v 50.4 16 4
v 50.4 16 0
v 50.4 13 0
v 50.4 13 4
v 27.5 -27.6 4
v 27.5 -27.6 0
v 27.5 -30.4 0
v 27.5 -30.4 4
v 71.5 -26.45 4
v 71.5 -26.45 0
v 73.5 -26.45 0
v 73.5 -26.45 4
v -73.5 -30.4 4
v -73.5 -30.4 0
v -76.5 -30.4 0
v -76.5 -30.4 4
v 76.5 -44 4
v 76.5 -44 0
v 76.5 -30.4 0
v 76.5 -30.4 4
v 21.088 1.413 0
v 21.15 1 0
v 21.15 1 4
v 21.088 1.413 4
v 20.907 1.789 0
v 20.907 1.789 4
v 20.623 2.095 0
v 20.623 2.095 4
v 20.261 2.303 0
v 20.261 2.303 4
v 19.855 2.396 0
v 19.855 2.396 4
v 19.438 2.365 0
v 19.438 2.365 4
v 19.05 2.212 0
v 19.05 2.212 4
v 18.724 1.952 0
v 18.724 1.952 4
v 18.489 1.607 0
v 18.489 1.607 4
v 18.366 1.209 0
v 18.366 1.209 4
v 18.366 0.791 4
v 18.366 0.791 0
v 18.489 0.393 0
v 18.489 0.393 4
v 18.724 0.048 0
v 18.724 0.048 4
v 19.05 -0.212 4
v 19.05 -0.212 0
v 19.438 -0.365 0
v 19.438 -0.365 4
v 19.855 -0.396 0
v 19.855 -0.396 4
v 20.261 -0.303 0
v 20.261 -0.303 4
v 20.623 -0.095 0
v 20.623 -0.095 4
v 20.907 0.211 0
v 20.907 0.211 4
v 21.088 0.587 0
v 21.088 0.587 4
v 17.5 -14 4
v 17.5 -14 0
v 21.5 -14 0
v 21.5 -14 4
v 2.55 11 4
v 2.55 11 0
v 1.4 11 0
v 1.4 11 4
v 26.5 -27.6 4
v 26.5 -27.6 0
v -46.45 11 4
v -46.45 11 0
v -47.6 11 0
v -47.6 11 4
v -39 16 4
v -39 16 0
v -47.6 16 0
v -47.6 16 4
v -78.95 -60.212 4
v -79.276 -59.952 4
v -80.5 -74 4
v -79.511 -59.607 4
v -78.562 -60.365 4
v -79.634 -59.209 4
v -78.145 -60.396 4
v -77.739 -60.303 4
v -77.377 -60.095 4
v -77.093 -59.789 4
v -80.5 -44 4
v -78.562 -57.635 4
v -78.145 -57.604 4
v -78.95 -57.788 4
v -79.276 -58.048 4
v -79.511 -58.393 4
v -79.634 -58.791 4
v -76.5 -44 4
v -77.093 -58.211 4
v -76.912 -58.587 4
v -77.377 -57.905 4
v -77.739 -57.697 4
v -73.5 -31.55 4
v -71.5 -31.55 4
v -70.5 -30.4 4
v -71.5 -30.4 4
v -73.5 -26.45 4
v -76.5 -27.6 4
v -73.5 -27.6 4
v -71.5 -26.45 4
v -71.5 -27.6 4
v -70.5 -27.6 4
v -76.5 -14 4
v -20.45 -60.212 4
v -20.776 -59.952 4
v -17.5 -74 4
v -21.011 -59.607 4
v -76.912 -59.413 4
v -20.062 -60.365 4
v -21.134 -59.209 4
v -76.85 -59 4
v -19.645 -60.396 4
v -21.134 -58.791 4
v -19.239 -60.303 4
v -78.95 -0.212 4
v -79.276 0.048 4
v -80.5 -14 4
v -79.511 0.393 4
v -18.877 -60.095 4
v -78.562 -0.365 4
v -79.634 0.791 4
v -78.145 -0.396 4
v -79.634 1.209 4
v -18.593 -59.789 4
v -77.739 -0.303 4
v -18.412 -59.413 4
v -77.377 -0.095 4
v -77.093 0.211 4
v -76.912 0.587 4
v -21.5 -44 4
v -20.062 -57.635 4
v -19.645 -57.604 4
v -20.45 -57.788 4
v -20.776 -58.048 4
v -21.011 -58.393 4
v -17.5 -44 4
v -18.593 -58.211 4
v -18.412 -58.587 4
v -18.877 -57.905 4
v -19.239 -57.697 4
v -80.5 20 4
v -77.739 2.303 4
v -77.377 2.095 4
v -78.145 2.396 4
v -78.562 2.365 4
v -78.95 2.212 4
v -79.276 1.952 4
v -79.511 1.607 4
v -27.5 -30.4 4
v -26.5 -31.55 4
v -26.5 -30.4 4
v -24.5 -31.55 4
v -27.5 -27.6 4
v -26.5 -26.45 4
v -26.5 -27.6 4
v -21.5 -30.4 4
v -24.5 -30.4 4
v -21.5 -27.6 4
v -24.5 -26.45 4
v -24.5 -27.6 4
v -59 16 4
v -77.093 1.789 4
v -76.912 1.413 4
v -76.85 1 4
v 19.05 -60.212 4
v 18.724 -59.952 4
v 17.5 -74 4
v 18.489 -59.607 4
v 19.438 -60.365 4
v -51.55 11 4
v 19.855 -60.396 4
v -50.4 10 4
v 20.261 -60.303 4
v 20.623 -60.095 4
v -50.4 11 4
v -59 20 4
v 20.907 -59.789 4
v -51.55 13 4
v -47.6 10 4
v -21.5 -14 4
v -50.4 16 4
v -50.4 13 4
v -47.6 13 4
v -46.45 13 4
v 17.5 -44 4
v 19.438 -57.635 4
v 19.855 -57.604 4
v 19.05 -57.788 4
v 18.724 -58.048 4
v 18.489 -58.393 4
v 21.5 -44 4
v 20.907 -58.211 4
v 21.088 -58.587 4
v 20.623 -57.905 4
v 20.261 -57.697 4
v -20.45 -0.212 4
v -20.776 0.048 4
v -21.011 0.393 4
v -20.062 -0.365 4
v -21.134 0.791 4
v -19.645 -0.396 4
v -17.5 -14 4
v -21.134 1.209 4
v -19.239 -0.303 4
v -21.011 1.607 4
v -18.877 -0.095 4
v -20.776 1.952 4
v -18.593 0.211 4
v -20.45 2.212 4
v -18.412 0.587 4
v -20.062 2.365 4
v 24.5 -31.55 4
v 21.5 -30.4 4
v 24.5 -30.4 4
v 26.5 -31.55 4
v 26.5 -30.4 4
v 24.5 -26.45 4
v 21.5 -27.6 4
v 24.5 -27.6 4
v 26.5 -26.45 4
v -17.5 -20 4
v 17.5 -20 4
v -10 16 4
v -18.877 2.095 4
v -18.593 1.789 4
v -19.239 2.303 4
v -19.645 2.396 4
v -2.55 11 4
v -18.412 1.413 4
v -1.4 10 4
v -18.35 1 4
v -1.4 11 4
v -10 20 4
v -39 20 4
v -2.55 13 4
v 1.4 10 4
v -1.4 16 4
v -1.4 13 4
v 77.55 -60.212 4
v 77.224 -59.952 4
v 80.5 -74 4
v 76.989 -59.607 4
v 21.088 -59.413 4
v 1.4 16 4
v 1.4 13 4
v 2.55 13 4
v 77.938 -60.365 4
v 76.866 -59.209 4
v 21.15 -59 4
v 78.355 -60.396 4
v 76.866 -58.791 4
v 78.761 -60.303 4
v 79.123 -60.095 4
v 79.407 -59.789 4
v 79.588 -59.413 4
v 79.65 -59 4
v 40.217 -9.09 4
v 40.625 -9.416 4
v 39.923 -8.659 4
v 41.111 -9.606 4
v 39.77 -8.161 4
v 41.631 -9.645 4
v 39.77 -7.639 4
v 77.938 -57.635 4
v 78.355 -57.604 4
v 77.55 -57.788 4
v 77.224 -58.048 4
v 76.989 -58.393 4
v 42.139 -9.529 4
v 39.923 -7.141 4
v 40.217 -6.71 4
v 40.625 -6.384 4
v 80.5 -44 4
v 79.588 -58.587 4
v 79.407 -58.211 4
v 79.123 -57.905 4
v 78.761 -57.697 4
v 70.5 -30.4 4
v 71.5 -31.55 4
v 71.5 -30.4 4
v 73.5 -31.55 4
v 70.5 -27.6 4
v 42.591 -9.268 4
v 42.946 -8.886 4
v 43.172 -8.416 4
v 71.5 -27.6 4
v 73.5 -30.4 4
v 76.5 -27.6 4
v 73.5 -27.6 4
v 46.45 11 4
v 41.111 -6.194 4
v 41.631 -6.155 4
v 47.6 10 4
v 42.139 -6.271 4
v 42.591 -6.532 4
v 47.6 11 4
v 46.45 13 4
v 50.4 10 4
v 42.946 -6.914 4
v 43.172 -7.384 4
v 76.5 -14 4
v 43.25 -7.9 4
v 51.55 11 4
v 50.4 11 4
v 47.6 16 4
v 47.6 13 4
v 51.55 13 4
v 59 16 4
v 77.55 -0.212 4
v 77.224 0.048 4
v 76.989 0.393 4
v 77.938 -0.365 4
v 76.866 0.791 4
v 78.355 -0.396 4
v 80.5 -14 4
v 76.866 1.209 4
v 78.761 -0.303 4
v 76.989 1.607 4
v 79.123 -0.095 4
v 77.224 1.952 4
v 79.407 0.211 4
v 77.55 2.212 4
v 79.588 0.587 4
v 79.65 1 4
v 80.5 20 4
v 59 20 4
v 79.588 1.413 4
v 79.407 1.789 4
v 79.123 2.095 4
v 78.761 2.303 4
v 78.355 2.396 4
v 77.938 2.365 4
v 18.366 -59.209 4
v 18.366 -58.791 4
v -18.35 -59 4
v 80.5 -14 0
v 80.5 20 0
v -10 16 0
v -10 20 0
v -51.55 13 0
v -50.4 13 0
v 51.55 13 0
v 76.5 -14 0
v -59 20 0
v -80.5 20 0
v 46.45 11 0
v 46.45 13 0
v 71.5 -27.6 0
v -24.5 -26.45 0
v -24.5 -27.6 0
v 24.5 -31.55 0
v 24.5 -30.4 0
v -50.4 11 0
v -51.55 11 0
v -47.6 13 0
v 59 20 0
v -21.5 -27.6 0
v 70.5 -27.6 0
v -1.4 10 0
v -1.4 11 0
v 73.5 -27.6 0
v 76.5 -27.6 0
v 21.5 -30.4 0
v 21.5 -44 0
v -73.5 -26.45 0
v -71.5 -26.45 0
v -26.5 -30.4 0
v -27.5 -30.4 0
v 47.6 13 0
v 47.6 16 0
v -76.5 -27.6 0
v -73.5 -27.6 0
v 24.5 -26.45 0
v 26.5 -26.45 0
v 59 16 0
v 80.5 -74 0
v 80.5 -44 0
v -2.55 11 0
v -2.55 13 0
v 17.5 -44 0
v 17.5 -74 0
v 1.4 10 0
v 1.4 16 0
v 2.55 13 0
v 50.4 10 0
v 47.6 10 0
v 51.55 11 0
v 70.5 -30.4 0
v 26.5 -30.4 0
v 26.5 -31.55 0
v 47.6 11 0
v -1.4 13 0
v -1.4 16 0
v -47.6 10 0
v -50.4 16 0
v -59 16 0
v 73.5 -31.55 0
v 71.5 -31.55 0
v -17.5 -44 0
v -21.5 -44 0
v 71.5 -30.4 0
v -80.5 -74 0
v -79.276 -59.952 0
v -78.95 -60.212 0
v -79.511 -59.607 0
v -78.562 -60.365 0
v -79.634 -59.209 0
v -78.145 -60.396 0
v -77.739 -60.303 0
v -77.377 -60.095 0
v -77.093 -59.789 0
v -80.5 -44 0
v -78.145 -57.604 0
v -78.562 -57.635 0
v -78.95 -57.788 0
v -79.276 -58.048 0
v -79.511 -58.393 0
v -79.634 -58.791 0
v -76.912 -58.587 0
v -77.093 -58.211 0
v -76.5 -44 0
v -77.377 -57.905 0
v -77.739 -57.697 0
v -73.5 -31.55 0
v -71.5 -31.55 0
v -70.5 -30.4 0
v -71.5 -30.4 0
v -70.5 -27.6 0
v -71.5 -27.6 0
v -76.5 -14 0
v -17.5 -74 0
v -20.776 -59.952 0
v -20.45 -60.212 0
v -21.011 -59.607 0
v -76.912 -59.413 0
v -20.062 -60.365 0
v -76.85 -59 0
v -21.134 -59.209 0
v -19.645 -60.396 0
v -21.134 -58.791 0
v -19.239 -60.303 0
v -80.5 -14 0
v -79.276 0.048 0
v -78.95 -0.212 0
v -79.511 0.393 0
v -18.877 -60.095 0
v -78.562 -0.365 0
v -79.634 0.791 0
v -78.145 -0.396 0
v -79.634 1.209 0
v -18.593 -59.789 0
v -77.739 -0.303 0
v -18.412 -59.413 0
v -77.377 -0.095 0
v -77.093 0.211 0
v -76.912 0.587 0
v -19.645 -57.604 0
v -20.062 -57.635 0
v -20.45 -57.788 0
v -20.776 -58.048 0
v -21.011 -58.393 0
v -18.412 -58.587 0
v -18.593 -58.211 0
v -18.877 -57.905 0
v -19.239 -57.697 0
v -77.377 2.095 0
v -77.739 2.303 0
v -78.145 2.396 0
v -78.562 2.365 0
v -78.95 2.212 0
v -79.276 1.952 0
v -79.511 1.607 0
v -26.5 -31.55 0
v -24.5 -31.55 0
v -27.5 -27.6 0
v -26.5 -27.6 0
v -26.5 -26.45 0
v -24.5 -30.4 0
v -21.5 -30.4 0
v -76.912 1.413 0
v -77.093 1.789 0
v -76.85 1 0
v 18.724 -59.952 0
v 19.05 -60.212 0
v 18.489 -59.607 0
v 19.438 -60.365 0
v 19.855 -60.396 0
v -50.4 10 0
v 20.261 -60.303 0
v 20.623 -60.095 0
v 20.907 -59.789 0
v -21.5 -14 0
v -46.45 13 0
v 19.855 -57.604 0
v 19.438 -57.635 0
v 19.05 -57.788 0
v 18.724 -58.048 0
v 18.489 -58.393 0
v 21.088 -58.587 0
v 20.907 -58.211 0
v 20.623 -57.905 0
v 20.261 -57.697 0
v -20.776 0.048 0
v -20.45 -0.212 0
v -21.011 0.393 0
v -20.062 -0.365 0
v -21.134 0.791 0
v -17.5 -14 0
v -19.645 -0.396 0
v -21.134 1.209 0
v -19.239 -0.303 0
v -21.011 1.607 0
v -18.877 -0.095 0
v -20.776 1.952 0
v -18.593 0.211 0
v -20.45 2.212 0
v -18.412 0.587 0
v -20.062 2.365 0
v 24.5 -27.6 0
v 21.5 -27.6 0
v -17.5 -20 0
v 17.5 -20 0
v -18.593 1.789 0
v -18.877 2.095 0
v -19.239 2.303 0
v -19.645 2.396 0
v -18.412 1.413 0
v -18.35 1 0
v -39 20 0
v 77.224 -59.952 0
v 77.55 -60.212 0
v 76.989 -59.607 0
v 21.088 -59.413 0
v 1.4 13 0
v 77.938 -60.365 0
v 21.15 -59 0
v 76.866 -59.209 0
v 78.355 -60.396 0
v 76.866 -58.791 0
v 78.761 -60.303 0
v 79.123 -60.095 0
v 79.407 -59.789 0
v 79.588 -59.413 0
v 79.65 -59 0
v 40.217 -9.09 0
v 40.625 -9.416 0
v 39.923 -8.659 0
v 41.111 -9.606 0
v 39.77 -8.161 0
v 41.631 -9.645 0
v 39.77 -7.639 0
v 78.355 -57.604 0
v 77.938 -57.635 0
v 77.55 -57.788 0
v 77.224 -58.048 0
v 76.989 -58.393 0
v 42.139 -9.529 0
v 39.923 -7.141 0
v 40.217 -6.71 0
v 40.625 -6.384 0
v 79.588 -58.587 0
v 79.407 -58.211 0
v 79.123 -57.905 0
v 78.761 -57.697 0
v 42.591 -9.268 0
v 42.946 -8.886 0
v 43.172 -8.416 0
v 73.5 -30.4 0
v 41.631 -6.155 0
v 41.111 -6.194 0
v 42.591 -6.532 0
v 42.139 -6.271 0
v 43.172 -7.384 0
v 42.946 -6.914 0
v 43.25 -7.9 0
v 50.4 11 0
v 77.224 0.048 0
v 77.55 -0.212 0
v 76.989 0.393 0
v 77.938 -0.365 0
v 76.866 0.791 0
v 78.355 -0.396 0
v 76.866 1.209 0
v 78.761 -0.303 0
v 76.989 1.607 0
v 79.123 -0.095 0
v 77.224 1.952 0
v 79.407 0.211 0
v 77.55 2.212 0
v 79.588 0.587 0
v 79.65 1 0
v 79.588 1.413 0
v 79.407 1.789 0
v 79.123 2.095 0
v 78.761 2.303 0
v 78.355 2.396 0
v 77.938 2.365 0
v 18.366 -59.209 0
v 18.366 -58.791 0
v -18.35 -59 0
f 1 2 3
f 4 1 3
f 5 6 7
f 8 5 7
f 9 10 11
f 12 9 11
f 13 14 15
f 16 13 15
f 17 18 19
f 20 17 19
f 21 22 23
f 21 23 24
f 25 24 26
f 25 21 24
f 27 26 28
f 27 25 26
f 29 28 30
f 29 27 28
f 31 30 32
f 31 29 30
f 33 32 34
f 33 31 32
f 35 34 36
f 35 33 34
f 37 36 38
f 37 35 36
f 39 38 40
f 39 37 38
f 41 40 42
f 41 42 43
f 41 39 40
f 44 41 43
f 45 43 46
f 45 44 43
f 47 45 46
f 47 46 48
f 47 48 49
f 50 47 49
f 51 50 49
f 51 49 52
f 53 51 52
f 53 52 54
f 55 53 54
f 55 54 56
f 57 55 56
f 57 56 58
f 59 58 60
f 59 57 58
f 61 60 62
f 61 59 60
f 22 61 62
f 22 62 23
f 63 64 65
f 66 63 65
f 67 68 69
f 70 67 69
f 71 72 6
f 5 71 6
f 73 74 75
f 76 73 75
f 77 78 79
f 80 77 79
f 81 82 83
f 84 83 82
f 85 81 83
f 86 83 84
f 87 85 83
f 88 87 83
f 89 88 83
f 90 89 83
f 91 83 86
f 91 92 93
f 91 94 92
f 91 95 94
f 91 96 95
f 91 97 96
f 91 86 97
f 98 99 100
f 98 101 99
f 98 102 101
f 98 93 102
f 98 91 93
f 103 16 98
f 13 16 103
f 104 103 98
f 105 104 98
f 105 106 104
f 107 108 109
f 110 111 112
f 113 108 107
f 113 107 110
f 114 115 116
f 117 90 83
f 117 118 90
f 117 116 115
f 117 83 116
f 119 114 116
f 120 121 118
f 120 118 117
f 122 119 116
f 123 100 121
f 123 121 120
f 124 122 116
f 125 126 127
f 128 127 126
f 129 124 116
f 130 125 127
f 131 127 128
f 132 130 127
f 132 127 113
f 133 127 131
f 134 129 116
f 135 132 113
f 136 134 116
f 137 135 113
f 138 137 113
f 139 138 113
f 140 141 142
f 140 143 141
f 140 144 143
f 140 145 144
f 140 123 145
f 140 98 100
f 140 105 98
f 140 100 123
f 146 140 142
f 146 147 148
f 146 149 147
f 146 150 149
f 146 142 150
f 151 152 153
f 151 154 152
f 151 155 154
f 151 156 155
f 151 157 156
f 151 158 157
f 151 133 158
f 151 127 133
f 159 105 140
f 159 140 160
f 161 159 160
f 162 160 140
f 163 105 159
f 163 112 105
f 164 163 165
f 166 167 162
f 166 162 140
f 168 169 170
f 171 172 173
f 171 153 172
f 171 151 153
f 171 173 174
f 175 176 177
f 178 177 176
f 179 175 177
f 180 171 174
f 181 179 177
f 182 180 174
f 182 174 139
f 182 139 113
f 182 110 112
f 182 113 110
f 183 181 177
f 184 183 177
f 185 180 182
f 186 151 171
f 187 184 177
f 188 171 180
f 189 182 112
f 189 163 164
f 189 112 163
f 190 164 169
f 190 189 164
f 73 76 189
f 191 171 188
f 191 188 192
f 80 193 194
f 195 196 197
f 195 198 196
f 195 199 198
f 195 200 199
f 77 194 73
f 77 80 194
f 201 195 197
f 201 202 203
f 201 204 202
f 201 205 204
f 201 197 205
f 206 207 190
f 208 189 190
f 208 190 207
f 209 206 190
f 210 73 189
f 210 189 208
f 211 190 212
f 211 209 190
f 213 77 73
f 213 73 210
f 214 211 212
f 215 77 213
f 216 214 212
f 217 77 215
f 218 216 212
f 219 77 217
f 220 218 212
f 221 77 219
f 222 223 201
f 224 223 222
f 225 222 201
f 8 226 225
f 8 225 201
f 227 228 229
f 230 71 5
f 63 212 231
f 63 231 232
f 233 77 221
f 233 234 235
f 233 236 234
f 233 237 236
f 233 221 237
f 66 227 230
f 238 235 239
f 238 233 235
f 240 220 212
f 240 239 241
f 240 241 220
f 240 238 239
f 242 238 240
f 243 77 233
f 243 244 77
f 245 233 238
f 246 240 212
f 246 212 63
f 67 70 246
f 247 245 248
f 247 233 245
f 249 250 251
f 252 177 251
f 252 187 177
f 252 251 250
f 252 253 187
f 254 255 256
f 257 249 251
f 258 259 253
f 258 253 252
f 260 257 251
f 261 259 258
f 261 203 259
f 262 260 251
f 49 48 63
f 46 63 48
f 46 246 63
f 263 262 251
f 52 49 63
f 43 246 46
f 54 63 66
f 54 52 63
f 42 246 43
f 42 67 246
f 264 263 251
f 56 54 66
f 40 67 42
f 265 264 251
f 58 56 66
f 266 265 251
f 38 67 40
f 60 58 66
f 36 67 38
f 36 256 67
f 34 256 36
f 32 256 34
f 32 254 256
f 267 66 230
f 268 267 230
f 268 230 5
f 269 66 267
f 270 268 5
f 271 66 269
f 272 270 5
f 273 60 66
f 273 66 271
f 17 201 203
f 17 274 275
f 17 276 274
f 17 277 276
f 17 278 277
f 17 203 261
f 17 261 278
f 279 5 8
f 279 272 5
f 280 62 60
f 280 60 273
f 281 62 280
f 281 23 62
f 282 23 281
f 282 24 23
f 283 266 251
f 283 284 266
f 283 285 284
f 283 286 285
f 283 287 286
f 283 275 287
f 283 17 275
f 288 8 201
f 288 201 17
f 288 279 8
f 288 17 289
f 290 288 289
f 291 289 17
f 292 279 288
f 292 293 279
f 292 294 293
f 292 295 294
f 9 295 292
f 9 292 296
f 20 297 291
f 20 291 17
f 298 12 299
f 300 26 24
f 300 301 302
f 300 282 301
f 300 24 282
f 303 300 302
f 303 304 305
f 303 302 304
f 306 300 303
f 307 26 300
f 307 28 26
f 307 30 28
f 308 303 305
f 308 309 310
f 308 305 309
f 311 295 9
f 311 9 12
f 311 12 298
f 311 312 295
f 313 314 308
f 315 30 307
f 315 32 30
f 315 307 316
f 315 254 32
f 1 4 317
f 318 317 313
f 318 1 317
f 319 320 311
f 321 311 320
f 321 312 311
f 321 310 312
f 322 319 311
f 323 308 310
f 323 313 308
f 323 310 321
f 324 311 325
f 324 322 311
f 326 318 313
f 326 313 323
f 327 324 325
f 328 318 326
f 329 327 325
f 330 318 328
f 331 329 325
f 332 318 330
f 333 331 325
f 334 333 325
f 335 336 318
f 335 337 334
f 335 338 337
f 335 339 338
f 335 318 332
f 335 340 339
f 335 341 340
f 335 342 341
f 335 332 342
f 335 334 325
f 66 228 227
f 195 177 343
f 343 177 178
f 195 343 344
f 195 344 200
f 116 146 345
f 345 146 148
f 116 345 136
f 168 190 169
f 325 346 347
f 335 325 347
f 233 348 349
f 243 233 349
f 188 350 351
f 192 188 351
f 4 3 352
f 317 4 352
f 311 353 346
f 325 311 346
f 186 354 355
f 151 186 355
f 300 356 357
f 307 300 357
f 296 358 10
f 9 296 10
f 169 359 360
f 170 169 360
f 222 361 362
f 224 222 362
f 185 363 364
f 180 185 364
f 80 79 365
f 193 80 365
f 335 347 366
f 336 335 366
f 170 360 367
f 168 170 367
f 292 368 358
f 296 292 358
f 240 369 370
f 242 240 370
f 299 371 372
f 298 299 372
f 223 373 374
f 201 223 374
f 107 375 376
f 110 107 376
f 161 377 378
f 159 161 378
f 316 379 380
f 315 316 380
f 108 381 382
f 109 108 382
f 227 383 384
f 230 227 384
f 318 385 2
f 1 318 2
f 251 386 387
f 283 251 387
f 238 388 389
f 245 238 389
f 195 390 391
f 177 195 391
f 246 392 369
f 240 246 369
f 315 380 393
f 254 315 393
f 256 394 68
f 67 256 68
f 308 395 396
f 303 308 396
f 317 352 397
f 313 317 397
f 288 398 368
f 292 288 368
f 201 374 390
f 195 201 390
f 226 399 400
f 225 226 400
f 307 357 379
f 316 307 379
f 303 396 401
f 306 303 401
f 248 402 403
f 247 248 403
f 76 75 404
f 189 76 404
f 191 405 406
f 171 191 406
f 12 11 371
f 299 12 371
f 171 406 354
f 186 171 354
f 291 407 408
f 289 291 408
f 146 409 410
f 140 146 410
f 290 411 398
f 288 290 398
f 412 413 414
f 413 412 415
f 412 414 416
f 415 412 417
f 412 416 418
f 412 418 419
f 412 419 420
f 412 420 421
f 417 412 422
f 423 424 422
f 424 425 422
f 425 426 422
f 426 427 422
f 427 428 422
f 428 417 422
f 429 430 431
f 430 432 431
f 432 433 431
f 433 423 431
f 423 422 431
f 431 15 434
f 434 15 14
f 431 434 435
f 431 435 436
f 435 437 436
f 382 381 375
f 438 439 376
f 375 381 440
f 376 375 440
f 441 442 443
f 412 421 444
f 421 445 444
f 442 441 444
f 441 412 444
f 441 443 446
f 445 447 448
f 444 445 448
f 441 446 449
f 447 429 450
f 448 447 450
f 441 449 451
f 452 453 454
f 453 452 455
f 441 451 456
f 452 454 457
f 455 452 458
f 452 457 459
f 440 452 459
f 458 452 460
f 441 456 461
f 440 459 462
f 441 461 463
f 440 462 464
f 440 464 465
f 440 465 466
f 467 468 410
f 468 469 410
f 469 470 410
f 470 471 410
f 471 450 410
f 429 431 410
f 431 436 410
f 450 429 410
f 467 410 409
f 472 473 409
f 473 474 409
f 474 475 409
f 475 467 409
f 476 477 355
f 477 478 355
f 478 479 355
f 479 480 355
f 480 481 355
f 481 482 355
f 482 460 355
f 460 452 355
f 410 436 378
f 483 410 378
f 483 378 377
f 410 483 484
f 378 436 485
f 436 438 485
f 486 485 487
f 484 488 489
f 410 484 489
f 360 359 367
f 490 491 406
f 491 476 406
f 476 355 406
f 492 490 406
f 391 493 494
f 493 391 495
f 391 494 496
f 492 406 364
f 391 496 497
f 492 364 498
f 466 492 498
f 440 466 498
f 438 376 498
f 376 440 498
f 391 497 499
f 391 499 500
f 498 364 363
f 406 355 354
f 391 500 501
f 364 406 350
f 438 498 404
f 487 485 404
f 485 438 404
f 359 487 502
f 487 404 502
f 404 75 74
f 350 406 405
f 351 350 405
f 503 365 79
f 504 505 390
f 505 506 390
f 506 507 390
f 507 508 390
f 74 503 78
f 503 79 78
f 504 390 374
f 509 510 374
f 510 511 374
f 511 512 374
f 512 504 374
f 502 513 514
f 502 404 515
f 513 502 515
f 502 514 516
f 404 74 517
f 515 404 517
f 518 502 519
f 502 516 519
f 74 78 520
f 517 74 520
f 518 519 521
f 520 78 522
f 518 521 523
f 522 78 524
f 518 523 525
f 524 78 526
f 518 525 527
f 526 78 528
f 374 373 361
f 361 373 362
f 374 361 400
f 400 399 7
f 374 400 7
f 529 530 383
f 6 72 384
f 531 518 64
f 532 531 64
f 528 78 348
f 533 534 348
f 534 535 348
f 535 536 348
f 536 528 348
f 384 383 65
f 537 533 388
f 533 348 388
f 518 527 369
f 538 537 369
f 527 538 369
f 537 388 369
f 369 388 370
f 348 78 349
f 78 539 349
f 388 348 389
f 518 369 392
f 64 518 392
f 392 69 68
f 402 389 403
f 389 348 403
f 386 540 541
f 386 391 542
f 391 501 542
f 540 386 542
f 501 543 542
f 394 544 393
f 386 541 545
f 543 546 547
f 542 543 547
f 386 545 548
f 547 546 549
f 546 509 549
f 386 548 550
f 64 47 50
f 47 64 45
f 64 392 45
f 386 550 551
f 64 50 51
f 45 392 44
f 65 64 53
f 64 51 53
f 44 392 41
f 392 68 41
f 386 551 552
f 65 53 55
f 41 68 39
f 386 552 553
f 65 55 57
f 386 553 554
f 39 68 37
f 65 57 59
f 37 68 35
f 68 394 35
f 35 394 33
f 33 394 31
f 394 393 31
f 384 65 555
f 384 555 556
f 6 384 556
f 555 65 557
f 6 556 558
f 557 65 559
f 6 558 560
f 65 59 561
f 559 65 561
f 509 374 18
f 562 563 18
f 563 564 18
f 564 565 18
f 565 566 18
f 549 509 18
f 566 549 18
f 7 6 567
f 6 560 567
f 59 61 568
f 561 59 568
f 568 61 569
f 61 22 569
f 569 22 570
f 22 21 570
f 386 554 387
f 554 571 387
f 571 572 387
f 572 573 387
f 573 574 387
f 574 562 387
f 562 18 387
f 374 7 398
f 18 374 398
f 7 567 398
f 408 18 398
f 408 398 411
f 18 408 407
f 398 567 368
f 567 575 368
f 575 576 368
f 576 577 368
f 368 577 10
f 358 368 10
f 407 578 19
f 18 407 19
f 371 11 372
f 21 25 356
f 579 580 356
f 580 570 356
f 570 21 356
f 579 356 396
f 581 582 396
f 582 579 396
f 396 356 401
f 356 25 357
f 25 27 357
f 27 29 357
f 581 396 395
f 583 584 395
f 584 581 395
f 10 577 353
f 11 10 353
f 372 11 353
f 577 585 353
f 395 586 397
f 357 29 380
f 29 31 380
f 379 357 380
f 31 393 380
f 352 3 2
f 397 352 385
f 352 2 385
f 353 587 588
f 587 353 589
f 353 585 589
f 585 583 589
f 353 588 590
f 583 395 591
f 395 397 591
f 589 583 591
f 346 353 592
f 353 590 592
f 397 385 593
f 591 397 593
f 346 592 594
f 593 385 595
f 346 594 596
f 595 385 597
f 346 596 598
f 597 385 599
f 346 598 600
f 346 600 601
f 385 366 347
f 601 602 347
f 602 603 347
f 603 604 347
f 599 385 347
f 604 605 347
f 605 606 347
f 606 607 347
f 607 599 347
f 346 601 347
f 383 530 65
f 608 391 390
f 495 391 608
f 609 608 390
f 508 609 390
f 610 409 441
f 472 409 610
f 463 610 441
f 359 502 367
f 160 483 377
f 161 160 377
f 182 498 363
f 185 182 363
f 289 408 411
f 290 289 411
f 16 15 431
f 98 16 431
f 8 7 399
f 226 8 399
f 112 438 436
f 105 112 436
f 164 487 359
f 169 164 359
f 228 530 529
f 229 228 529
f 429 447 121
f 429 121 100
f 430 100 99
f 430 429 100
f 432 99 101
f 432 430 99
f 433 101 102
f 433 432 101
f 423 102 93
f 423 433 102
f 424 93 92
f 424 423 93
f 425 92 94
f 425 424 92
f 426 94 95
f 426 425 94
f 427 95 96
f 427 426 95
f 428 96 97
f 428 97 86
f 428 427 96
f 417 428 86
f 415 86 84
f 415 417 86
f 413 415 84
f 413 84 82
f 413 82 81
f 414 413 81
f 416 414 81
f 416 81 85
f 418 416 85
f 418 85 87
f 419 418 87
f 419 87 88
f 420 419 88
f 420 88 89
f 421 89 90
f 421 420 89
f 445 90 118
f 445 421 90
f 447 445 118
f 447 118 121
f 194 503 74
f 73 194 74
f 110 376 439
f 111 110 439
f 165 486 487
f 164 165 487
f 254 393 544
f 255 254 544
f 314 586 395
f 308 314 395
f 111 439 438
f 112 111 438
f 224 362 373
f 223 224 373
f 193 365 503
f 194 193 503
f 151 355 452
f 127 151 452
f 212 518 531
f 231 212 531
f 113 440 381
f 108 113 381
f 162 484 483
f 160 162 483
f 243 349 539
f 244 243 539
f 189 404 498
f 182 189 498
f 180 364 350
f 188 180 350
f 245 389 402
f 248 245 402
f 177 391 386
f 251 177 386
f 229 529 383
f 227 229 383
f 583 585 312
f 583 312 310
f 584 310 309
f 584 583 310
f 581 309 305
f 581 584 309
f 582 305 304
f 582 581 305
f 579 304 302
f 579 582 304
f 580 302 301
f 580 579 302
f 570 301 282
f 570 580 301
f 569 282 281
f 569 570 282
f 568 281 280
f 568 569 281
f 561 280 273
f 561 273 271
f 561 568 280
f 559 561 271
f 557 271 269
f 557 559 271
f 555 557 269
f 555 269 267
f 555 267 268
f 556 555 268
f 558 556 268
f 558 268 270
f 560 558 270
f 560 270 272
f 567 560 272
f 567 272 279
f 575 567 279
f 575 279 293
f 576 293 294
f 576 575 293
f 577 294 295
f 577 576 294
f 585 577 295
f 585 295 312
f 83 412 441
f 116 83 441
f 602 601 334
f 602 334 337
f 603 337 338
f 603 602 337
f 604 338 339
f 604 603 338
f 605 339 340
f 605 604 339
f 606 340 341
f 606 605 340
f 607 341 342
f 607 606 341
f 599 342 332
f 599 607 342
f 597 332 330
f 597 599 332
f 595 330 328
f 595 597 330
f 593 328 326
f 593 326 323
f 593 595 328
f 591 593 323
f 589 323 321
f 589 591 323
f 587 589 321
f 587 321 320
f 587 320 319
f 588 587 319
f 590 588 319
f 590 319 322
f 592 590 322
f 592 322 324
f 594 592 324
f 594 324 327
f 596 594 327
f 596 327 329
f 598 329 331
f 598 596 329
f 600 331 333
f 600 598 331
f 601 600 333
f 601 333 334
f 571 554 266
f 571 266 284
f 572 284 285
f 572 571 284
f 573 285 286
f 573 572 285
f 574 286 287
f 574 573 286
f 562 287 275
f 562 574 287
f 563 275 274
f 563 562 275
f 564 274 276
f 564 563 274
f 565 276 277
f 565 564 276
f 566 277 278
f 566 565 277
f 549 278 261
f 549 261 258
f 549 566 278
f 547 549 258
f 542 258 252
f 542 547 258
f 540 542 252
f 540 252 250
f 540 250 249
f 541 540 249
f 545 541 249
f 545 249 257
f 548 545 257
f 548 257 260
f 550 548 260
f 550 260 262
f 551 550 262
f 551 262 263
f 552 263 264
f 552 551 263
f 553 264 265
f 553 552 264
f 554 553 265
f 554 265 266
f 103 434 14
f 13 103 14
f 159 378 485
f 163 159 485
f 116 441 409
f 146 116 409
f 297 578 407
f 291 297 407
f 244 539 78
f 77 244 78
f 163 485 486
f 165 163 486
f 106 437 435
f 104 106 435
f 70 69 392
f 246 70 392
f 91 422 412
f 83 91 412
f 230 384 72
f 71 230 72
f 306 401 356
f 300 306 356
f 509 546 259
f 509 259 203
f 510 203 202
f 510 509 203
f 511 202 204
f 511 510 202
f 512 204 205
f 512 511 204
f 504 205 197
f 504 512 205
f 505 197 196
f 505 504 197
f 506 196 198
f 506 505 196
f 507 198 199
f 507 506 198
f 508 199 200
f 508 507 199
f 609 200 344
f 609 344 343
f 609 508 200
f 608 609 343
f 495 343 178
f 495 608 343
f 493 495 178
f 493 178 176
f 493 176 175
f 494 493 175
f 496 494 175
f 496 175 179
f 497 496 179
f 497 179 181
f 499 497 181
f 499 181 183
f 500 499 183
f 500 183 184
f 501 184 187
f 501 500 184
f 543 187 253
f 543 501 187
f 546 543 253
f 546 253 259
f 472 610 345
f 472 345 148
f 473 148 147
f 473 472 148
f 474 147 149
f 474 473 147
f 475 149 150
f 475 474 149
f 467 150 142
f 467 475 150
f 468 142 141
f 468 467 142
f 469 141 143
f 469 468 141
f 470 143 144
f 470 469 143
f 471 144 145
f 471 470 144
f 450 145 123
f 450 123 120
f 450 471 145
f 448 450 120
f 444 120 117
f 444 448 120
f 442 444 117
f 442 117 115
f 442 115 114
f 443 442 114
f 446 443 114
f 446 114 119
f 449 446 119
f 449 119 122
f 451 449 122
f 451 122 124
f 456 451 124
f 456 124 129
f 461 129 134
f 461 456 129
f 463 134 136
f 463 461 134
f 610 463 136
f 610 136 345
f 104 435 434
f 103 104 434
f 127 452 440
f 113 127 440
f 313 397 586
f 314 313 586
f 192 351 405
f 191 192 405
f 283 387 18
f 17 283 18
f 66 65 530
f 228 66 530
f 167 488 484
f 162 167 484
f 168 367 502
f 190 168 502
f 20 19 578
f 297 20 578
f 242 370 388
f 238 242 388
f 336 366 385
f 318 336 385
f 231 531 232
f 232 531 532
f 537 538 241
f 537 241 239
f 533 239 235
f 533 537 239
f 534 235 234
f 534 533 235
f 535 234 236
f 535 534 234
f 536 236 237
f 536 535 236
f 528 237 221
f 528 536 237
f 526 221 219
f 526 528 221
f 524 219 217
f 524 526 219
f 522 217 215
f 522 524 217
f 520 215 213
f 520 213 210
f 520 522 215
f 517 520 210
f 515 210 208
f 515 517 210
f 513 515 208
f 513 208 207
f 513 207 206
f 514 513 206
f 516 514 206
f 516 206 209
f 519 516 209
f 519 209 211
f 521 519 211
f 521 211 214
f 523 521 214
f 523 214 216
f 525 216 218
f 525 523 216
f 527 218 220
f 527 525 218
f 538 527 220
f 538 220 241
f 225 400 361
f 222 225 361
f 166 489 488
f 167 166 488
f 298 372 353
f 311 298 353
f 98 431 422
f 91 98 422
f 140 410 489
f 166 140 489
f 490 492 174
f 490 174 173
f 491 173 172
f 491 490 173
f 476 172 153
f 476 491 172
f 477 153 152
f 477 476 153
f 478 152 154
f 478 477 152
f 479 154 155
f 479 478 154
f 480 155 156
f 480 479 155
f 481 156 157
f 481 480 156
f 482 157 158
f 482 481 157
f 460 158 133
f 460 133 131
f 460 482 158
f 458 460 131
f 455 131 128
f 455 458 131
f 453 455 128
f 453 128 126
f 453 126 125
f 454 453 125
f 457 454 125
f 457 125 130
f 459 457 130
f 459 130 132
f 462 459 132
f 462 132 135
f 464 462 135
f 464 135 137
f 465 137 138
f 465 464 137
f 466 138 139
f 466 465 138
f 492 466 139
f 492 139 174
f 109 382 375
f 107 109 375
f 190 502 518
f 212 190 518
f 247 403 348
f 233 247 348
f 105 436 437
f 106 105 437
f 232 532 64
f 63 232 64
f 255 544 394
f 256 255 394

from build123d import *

# Parameters (mm, degrees)
SKETCH_1_R      = 1.4
SKETCH_1_R_2    = 1.75
EXTRUDE_1_DEPTH = 4


with BuildPart() as part:
    # Эскиз1 → Бобышка-Вытянуть1 (new body)
    with BuildSketch(Plane.XY):
        Polygon((-17.5, -14), (-17.5, -20), (17.5, -20), (17.5, -14), (21.5, -14), (21.5, -27.6), (24.5, -27.6), (24.5, -26.45), (26.5, -26.45), (26.5, -27.6), (27.5, -27.6), (27.5, -30.4), (26.5, -30.4), (26.5, -31.55), (24.5, -31.55), (24.5, -30.4), (21.5, -30.4), (21.5, -44), (17.5, -44), (17.5, -74), (80.5, -74), (80.5, -44), (76.5, -44), (76.5, -30.4), (73.5, -30.4), (73.5, -31.55), (71.5, -31.55), (71.5, -30.4), (70.5, -30.4), (70.5, -27.6), (71.5, -27.6), (71.5, -26.45), (73.5, -26.45), (73.5, -27.6), (76.5, -27.6), (76.5, -14), (80.5, -14), (80.5, 20), (59, 20), (59, 16), (50.4, 16), (50.4, 13), (51.55, 13), (51.55, 11), (50.4, 11), (50.4, 10), (47.6, 10), (47.6, 11), (46.45, 11), (46.45, 13), (47.6, 13), (47.6, 16), (1.4, 16), (1.4, 13), (2.55, 13), (2.55, 11), (1.4, 11), (1.4, 10), (-1.4, 10), (-1.4, 11), (-2.55, 11), (-2.55, 13), (-1.4, 13), (-1.4, 16), (-10, 16), (-10, 20), (-39, 20), (-39, 16), (-47.6, 16), (-47.6, 13), (-46.45, 13), (-46.45, 11), (-47.6, 11), (-47.6, 10), (-50.4, 10), (-50.4, 11), (-51.55, 11), (-51.55, 13), (-50.4, 13), (-50.4, 16), (-59, 16), (-59, 20), (-80.5, 20), (-80.5, -14), (-76.5, -14), (-76.5, -27.6), (-73.5, -27.6), (-73.5, -26.45), (-71.5, -26.45), (-71.5, -27.6), (-70.5, -27.6), (-70.5, -30.4), (-71.5, -30.4), (-71.5, -31.55), (-73.5, -31.55), (-73.5, -30.4), (-76.5, -30.4), (-76.5, -44), (-80.5, -44), (-80.5, -74), (-17.5, -74), (-17.5, -44), (-21.5, -44), (-21.5, -30.4), (-24.5, -30.4), (-24.5, -31.55), (-26.5, -31.55), (-26.5, -30.4), (-27.5, -30.4), (-27.5, -27.6), (-26.5, -27.6), (-26.5, -26.45), (-24.5, -26.45), (-24.5, -27.6), (-21.5, -27.6), (-21.5, -14), align=None)
        with Locations((-19.75, 1)):
            Circle(SKETCH_1_R, mode=Mode.SUBTRACT)
        with Locations((-78.25, -59)):
            Circle(SKETCH_1_R, mode=Mode.SUBTRACT)
        with Locations((-19.75, -59)):
            Circle(SKETCH_1_R, mode=Mode.SUBTRACT)
        with Locations((-78.25, 1)):
            Circle(SKETCH_1_R, mode=Mode.SUBTRACT)
        with Locations((78.25, 1)):
            Circle(SKETCH_1_R, mode=Mode.SUBTRACT)
        with Locations((19.75, -59)):
            Circle(SKETCH_1_R, mode=Mode.SUBTRACT)
        with Locations((78.25, -59)):
            Circle(SKETCH_1_R, mode=Mode.SUBTRACT)
        with Locations((41.5, -7.9)):
            Circle(SKETCH_1_R_2, mode=Mode.SUBTRACT)
        with Locations((19.75, 1)):
            Circle(SKETCH_1_R, mode=Mode.SUBTRACT)
    extrude(amount=EXTRUDE_1_DEPTH)


solid = part.part
